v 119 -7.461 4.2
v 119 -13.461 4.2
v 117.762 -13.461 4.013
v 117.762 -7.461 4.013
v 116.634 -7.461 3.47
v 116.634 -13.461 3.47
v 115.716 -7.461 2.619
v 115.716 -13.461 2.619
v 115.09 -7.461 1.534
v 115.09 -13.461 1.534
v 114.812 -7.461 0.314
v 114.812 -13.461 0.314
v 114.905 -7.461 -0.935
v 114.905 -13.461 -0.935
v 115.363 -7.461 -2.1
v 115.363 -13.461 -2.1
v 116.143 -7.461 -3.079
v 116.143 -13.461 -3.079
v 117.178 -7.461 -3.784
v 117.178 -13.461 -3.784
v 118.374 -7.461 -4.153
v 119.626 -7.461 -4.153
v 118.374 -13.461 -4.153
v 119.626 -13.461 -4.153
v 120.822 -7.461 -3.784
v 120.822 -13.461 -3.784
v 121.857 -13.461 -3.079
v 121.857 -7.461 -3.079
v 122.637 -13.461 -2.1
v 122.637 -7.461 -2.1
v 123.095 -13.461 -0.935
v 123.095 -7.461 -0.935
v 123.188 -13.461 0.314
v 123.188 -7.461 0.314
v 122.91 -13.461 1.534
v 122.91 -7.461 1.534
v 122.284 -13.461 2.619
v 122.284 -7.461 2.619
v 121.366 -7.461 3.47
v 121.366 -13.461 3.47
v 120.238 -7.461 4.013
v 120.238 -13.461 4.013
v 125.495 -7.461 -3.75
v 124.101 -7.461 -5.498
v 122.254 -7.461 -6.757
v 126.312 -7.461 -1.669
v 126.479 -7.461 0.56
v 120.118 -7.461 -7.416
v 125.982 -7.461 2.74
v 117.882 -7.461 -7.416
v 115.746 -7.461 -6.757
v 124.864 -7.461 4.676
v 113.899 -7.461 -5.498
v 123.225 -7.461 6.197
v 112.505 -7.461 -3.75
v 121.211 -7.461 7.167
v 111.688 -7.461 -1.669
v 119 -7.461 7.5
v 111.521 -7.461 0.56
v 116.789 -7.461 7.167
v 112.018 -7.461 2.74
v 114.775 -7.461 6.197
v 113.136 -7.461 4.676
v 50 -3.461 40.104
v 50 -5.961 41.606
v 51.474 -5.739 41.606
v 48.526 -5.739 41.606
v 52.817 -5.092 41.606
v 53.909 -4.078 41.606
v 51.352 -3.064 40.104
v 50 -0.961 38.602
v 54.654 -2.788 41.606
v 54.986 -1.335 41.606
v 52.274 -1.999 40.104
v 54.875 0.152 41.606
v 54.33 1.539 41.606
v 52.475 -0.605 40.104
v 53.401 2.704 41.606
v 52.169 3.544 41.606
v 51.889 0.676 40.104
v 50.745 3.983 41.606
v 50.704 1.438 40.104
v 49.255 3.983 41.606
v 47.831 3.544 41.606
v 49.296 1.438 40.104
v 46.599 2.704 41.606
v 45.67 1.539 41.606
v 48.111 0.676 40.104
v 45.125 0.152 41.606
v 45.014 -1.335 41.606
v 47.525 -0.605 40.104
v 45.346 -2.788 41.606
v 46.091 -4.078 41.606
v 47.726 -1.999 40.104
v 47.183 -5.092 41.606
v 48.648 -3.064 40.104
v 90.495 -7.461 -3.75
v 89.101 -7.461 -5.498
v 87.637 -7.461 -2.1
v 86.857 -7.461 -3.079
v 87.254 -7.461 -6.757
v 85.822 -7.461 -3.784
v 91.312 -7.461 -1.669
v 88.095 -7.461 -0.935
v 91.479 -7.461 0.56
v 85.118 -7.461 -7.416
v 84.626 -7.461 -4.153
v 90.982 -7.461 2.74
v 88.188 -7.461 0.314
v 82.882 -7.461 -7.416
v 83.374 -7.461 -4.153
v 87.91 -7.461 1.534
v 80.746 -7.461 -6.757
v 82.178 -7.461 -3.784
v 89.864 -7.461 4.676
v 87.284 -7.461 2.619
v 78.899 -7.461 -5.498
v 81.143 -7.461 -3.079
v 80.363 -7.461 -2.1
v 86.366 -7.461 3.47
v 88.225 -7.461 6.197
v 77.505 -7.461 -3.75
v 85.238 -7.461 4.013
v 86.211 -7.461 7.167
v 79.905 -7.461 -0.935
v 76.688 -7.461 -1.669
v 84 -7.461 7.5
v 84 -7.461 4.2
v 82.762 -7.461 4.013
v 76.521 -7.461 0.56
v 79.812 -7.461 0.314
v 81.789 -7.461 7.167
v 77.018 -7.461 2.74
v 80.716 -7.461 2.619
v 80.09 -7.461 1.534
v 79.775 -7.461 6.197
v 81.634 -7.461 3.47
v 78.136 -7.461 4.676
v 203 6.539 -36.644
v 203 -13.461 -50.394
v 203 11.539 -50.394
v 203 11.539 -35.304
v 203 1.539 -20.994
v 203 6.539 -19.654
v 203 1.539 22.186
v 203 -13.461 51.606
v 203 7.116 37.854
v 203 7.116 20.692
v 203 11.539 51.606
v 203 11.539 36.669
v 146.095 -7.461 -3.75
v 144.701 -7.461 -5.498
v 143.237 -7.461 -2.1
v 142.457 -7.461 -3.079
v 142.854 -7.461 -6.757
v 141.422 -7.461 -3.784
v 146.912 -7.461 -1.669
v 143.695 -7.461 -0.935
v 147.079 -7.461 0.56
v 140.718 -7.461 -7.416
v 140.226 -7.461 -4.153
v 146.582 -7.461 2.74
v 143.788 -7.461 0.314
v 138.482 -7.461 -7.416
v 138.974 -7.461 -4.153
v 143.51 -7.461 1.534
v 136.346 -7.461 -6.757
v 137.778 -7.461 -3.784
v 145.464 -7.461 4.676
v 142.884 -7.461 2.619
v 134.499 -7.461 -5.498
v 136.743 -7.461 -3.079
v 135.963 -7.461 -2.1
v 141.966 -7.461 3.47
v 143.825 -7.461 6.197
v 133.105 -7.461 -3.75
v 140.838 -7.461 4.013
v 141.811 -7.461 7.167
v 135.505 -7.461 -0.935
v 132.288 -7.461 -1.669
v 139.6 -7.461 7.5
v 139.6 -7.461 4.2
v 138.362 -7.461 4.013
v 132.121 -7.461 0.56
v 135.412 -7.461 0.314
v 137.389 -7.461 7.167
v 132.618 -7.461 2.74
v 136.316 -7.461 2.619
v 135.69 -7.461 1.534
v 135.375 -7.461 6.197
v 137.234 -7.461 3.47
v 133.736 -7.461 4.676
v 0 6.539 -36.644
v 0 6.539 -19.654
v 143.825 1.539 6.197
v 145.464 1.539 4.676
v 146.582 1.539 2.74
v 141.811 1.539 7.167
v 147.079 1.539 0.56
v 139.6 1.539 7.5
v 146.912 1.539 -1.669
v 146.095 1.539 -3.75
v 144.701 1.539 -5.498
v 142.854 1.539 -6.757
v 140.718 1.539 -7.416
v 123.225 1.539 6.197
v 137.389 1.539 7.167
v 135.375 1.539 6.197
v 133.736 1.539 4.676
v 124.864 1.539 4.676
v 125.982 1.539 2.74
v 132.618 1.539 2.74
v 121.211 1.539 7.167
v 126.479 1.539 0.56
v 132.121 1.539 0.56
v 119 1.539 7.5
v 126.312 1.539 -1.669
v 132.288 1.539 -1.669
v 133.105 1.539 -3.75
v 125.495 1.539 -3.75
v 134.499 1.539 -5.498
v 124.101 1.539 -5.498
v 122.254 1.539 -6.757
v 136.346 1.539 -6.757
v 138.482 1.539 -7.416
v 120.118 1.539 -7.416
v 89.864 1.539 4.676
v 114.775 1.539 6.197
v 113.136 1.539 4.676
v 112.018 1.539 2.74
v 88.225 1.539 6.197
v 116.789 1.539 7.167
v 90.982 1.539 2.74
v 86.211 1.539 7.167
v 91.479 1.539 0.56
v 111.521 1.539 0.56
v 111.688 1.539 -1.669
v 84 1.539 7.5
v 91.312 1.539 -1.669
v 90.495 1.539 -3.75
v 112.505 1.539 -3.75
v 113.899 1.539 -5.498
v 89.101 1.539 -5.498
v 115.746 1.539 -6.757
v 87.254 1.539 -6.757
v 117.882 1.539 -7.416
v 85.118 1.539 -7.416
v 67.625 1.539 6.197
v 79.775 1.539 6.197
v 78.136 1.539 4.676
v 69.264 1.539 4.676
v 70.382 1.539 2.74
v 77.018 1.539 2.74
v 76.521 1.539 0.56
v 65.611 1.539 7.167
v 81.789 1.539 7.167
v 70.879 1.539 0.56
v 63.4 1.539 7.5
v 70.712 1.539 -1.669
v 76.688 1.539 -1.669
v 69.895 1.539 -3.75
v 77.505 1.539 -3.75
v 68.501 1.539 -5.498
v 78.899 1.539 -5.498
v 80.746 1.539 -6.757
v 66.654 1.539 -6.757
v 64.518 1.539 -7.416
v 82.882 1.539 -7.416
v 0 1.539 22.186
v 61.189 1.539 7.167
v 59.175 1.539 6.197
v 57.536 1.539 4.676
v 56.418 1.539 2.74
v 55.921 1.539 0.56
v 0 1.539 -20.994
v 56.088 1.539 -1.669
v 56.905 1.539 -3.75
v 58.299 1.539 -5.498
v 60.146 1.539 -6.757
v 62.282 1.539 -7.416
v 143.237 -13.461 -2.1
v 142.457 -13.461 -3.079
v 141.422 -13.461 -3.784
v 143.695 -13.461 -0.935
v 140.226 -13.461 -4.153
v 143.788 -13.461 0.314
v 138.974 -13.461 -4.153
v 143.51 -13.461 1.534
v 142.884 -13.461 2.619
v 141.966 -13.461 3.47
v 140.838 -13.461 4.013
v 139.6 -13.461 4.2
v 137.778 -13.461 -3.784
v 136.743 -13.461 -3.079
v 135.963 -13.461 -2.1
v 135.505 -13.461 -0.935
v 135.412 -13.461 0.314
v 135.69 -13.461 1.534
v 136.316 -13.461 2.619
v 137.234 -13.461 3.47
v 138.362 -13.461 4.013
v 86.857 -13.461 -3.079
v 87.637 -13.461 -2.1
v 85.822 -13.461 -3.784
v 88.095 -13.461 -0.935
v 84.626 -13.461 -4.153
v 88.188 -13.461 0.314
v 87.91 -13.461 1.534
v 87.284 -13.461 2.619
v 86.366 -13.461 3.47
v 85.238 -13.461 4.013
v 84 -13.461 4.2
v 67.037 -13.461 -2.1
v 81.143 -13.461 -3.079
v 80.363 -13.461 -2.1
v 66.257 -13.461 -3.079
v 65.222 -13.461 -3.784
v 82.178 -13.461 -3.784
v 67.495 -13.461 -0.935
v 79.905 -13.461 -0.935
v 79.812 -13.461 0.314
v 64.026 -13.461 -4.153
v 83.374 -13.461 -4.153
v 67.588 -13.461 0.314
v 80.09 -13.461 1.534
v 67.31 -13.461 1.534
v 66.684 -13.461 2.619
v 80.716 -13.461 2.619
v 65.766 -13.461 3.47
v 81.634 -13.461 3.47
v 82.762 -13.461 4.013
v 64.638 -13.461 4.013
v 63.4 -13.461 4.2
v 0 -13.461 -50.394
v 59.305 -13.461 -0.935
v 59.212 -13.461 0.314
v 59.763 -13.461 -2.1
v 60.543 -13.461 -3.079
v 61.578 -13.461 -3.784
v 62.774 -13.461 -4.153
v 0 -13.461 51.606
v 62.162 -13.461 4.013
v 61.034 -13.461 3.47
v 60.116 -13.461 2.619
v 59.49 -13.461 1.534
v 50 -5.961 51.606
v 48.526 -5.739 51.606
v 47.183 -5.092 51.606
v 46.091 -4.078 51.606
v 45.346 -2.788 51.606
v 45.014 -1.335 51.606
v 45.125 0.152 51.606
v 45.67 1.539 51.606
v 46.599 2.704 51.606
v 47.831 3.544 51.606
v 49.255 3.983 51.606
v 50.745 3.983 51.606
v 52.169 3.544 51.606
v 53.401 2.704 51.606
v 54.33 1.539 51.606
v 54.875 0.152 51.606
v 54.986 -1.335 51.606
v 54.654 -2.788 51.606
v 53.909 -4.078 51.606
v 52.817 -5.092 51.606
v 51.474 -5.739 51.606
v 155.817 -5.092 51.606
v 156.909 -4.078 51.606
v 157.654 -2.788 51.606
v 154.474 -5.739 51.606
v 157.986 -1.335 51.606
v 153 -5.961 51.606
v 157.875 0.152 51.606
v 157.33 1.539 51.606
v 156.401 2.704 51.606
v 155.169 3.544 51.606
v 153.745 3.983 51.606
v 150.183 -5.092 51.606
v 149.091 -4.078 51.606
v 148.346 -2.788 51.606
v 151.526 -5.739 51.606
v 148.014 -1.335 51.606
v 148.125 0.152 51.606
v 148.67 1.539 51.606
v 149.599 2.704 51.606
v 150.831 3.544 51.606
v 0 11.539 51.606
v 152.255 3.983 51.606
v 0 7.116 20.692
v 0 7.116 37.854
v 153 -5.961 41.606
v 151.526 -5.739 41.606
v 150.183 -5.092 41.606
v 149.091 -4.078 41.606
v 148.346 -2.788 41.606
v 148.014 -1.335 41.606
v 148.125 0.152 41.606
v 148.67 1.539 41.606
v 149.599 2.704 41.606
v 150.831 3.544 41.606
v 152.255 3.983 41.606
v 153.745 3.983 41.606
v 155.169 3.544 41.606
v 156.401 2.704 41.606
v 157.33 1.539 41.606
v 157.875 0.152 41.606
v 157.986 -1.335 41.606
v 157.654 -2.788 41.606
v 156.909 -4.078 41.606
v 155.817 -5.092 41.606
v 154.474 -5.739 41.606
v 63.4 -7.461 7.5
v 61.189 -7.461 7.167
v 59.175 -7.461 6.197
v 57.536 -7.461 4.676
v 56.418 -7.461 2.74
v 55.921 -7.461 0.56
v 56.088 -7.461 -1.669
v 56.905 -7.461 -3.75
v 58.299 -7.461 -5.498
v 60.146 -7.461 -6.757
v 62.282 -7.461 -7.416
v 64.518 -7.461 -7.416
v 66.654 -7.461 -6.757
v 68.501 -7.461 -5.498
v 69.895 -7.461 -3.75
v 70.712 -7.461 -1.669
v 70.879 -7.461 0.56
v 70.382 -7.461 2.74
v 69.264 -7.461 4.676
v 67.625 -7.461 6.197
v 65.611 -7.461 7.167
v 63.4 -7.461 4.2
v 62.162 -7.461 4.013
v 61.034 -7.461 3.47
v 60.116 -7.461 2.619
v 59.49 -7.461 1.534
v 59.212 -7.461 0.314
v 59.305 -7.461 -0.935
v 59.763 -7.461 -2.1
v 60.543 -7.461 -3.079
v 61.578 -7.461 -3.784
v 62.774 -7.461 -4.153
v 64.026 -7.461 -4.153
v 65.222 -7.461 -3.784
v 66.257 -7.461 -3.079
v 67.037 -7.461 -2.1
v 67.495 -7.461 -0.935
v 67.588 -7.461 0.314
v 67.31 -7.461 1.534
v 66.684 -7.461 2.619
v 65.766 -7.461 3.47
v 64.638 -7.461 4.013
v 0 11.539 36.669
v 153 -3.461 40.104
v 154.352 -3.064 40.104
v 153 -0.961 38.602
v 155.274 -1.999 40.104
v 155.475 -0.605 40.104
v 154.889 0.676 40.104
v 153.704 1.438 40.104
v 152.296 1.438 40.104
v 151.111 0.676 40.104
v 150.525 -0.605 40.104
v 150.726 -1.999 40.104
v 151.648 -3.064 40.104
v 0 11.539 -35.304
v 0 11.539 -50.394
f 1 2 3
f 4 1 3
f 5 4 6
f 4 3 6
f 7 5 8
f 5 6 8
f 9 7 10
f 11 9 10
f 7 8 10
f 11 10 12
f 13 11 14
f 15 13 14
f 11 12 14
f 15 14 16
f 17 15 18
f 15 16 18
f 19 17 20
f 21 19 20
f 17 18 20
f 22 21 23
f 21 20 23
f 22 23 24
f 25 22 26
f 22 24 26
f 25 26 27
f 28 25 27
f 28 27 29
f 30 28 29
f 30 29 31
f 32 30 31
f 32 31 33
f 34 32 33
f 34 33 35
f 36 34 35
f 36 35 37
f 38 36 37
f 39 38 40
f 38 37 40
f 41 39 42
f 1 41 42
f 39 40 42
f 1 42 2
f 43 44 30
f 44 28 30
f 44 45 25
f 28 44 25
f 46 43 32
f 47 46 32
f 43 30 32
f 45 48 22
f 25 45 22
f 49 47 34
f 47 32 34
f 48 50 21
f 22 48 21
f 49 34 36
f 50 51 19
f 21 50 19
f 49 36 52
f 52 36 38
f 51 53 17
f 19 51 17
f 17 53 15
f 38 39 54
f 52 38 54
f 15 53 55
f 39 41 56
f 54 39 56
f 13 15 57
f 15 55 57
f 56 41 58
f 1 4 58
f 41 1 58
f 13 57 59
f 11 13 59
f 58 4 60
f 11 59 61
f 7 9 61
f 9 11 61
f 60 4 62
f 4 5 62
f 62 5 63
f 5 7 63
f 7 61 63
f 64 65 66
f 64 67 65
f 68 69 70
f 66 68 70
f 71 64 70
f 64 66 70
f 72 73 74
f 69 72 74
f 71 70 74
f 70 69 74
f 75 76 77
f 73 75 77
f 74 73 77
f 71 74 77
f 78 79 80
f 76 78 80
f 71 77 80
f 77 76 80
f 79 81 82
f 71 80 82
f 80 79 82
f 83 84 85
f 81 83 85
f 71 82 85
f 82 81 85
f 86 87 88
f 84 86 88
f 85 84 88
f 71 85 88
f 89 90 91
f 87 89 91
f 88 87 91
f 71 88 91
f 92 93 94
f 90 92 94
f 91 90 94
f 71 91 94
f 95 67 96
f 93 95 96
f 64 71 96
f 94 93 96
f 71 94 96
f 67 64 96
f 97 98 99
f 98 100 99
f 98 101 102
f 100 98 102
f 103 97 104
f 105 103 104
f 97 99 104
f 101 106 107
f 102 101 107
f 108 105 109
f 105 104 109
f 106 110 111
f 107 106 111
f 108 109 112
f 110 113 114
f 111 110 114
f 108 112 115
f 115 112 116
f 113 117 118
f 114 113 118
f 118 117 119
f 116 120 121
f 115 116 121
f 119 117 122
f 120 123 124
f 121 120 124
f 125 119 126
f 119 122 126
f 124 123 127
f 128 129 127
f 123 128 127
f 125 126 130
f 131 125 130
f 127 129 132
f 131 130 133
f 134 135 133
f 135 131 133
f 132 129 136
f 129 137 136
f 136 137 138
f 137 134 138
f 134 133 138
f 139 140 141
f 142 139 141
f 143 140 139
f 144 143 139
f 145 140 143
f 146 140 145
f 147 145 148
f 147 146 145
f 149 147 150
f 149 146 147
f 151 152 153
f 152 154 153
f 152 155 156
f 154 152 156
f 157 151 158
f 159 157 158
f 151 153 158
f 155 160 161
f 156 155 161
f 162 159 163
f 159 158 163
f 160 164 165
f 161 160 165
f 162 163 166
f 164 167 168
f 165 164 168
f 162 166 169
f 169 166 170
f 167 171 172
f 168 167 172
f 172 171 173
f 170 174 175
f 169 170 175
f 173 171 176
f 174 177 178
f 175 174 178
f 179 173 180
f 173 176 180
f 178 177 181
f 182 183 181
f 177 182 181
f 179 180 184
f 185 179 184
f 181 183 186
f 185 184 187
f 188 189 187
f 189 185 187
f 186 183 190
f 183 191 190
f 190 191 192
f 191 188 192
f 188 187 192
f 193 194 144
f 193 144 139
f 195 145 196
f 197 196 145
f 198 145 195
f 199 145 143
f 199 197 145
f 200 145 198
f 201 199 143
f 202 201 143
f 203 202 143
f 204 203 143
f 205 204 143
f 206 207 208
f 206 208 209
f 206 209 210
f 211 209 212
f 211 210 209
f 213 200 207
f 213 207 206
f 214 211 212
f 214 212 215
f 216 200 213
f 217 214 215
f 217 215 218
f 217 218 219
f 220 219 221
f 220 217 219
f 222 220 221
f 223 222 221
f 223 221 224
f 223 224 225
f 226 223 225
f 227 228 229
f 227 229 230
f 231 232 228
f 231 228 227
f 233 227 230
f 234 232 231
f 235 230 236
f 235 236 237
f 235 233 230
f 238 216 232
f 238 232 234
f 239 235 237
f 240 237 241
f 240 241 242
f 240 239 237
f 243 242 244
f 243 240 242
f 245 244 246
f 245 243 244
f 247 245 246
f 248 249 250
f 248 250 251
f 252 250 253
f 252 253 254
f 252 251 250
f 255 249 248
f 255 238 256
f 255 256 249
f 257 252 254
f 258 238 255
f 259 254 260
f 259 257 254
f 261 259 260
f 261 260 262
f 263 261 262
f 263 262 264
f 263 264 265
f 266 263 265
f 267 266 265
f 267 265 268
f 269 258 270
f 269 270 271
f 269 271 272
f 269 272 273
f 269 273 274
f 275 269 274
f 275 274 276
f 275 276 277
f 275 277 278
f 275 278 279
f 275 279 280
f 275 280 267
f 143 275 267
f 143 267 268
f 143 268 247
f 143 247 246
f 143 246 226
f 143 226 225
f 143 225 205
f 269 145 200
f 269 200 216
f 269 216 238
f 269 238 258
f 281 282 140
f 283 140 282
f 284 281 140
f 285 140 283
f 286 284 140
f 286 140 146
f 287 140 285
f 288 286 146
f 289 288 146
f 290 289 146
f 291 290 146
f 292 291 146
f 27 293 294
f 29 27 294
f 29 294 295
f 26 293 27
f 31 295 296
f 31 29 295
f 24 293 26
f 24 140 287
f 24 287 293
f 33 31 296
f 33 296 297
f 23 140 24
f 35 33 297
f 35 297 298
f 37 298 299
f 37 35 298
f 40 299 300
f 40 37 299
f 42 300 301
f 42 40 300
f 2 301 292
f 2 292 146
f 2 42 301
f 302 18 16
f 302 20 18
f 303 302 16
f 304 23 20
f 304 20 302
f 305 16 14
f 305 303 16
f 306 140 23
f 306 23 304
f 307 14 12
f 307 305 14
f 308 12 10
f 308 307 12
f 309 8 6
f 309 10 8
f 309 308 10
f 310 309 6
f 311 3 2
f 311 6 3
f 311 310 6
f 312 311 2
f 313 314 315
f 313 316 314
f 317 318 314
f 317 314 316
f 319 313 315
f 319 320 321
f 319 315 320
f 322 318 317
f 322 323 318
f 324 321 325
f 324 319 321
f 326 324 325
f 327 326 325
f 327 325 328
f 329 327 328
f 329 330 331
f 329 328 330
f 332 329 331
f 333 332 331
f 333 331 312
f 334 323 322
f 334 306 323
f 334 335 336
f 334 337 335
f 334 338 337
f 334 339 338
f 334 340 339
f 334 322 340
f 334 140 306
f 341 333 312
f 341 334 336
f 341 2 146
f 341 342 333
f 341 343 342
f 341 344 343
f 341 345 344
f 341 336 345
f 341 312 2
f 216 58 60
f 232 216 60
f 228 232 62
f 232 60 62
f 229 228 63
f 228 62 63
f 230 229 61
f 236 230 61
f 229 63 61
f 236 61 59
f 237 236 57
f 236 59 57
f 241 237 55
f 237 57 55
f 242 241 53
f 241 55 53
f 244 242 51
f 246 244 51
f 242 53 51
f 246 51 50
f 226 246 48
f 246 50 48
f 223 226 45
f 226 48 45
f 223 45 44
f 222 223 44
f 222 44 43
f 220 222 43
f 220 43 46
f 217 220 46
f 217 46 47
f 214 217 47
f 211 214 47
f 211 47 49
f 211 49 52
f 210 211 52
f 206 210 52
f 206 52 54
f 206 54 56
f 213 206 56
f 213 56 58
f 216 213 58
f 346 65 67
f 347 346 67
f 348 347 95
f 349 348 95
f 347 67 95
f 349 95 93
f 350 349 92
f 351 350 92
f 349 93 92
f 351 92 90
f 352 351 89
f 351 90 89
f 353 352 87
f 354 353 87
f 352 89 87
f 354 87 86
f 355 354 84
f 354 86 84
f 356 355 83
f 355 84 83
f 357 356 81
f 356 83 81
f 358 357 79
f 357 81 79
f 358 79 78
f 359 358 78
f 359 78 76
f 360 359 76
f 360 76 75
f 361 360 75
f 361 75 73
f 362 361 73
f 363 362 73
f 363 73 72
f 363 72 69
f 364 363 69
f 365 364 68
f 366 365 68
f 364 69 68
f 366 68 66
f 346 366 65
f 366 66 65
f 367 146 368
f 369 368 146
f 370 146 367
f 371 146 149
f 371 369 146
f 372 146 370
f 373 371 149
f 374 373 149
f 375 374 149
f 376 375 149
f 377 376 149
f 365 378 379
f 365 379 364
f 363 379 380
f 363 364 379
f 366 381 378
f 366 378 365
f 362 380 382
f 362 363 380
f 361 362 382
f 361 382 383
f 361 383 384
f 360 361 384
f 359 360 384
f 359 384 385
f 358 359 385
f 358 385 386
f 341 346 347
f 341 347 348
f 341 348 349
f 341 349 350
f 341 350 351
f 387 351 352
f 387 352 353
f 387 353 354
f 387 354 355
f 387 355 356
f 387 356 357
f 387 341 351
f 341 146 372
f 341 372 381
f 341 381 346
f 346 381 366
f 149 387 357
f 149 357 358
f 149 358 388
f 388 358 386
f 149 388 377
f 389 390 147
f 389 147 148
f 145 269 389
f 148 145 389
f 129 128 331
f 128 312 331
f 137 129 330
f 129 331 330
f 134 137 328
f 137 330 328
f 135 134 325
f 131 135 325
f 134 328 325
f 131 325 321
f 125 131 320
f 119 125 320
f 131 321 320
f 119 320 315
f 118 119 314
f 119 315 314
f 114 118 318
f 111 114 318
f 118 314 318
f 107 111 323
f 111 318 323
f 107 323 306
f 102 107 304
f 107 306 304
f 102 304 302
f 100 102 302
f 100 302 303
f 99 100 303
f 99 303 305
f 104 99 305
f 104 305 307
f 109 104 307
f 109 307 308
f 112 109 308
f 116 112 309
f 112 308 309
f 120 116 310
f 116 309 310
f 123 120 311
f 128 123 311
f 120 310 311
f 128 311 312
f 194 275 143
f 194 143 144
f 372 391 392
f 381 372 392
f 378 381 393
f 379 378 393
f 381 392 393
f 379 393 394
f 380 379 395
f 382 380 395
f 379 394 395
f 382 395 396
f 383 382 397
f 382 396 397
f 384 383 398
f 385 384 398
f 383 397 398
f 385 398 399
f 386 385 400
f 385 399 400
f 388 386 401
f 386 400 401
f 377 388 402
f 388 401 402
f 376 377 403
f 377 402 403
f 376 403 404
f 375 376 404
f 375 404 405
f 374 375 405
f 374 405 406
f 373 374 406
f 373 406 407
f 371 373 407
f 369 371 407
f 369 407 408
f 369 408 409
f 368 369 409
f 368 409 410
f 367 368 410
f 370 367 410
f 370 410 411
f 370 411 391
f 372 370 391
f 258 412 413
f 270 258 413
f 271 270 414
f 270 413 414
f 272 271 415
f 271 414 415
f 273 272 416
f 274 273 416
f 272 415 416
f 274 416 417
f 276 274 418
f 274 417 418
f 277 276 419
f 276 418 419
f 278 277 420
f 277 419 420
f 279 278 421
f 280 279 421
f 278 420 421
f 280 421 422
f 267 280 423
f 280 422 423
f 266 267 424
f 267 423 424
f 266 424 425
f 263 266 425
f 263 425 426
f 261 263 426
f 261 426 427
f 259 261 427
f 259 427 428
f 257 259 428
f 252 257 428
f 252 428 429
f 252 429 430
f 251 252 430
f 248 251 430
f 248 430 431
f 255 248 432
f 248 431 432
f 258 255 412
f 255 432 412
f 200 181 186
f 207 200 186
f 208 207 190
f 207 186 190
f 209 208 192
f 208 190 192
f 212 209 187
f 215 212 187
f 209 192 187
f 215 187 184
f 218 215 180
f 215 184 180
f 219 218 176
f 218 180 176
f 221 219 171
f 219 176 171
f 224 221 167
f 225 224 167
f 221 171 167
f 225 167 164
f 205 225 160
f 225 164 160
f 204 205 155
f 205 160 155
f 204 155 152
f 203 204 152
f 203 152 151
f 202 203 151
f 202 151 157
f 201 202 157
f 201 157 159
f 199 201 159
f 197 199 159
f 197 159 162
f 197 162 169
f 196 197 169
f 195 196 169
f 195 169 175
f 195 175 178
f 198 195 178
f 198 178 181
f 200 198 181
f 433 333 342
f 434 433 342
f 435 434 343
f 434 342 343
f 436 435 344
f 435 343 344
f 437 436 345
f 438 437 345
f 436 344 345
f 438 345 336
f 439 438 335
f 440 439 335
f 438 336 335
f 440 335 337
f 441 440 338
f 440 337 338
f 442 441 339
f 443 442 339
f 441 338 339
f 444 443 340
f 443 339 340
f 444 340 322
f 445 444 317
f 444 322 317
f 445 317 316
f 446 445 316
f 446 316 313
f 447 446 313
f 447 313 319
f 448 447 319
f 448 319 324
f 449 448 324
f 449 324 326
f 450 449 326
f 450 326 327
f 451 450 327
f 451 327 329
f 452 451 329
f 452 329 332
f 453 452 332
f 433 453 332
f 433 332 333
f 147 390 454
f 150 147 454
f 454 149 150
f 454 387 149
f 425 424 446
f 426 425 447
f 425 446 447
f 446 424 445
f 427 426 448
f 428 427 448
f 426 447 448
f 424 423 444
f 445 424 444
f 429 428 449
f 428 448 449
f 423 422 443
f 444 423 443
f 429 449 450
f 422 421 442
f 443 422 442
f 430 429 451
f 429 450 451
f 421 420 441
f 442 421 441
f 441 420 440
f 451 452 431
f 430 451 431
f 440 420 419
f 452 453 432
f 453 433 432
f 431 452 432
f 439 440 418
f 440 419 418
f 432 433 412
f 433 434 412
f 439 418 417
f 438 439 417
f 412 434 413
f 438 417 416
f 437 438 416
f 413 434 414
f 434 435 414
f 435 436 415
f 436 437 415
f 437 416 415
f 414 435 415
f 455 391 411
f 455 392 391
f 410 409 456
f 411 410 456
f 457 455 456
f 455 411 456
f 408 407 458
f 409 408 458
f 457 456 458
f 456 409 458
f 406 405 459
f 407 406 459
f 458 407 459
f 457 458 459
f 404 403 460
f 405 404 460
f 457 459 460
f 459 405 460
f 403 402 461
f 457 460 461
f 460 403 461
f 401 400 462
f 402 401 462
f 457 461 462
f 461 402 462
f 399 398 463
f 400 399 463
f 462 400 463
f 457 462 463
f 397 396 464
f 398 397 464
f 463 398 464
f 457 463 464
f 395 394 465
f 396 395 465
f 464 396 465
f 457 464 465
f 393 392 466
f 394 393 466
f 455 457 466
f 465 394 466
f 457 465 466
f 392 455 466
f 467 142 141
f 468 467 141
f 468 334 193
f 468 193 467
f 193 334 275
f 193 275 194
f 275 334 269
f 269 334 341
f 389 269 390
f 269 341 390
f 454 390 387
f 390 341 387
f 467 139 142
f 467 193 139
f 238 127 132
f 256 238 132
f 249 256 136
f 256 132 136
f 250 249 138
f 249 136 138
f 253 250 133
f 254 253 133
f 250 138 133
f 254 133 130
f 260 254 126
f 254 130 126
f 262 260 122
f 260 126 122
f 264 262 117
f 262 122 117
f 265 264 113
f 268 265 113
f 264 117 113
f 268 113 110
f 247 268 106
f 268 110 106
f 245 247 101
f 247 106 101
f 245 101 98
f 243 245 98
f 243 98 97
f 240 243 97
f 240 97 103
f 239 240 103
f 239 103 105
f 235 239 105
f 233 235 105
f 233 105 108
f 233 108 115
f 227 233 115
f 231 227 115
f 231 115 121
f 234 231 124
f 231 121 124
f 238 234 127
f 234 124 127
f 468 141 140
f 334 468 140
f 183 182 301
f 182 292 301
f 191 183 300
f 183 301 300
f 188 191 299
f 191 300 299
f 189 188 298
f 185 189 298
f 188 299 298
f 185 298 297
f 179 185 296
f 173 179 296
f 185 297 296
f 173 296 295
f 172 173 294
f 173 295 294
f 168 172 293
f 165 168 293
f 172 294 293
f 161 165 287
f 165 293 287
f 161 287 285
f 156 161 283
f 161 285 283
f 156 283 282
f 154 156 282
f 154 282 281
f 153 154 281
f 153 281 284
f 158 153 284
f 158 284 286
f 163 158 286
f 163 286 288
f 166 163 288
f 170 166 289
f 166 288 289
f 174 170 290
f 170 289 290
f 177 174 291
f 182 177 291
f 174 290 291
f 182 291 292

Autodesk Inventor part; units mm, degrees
ref_plane "YZ Plane" through (0, 0, 0) normal (1, 0, 0) x (0, 1, 0)
ref_plane "XZ Plane" through (0, 0, 0) normal (0, 1, 0) x (-1, 0, 0)
ref_plane "XY Plane" through (0, 0, 0) normal (0, 0, 1) x (1, 0, 0)
sketch "Sketch1" plane through (0, 0, 0) normal (1, 0, 0) x (0, 1, 0)
  line L0 (-13.4609, 51.6064) -> (11.5391, 51.6064)
  line L1 (11.5391, -50.3936) -> (-13.4609, -50.3936)
  line L2 (-13.4609, -50.3936) -> (-13.4609, 51.6064)
  line L3 (-13.4609, 51.6064) -> (11.5391, -50.3936) construction
  line L4 (11.5391, 51.6064) -> (-13.4609, -50.3936) construction
  line L5 (1.5391, 22.1864) -> (1.5391, -20.9936)
  line L6 (7.1158, 37.8541) -> (11.5391, 36.6689)
  line L7 (6.5391, -36.6436) -> (11.5391, -35.3039)
  line L8 (6.5391, -36.6436) -> (13.9505, -36.6436) construction
  line L9 (1.5391, 22.1864) -> (7.1158, 20.6921)
  line L10 (1.5391, -20.9936) -> (6.5391, -19.6539)
  line L11 (7.1158, 37.8541) -> (7.1158, 20.6921)
  line L12 (6.5391, -19.6539) -> (6.5391, -36.6436)
  line L13 (11.5391, 51.6064) -> (11.5391, 36.6689)
  line L14 (11.5391, -35.3039) -> (11.5391, -50.3936)
  point P0 (-0.9609, 0.6064)
  dimension "d2" = 25
  dimension "d3" = 102
  dimension "d4" = 43.18
  dimension "d5" = 21.6
  dimension "d6" = 74.5
  dimension "d7" = 37.25
  dimension "d10" = 15
  dimension "d43" = 75
extrude "Extrusion1" add sketch "Sketch1" along normal blind 203
sketch "Sketch2" plane through (0, 1.5391, 22.1864) normal (0, 1, 0) x (1, 0, 0)
  point P0 (0, 22.1864)
  point P1 (63.4, 22.1864)
  point P2 (139.6, 22.1864)
  dimension "d14" = 76.2
  dimension "d15" = 63.4
hole "Hole1" at (63.4, 1.5391, 0) at (139.6, 1.5391, 0) direction (0, -1, 0) diameter 8.4 end through all counterbore diameter 15 counterbore depth 9
sketch "Sketch3" plane through (0, 1.5391, 22.1864) normal (0, 1, 0) x (1, 0, 0)
  point P0 (0, 22.1864)
  point P1 (84, 22.1864)
  point P2 (119, 22.1864)
  dimension "d23" = 35
  dimension "d24" = 84
hole "Hole2" at (84, 1.5391, 0) at (119, 1.5391, 0) direction (0, -1, 0) diameter 8.4 end through all counterbore diameter 15 counterbore depth 9
sketch "Sketch4" plane through (0, -13.4609, 51.6064) normal (0, 0, 1) x (1, 0, 0)
  line L0 (0, 0) -> (203, 0) projected
  line L1 (0, 0) -> (0, 25) projected
  line L2 (203, 25) -> (203, 0) projected
  point P0 (0, 13.4609)
  point P1 (50, 12.5)
  point P2 (153, 12.5)
  dimension "d32" = 12.5
  dimension "d33" = 12.5
  dimension "d34" = 50
  dimension "d35" = 50
hole "Hole3" at (50, -0.9609, 51.6064) at (153, -0.9609, 51.6064) direction (0, 0, -1) diameter 10 depth 10 tip angle 118
properties part number "czescuchwytu" material "Iron, Cast"
